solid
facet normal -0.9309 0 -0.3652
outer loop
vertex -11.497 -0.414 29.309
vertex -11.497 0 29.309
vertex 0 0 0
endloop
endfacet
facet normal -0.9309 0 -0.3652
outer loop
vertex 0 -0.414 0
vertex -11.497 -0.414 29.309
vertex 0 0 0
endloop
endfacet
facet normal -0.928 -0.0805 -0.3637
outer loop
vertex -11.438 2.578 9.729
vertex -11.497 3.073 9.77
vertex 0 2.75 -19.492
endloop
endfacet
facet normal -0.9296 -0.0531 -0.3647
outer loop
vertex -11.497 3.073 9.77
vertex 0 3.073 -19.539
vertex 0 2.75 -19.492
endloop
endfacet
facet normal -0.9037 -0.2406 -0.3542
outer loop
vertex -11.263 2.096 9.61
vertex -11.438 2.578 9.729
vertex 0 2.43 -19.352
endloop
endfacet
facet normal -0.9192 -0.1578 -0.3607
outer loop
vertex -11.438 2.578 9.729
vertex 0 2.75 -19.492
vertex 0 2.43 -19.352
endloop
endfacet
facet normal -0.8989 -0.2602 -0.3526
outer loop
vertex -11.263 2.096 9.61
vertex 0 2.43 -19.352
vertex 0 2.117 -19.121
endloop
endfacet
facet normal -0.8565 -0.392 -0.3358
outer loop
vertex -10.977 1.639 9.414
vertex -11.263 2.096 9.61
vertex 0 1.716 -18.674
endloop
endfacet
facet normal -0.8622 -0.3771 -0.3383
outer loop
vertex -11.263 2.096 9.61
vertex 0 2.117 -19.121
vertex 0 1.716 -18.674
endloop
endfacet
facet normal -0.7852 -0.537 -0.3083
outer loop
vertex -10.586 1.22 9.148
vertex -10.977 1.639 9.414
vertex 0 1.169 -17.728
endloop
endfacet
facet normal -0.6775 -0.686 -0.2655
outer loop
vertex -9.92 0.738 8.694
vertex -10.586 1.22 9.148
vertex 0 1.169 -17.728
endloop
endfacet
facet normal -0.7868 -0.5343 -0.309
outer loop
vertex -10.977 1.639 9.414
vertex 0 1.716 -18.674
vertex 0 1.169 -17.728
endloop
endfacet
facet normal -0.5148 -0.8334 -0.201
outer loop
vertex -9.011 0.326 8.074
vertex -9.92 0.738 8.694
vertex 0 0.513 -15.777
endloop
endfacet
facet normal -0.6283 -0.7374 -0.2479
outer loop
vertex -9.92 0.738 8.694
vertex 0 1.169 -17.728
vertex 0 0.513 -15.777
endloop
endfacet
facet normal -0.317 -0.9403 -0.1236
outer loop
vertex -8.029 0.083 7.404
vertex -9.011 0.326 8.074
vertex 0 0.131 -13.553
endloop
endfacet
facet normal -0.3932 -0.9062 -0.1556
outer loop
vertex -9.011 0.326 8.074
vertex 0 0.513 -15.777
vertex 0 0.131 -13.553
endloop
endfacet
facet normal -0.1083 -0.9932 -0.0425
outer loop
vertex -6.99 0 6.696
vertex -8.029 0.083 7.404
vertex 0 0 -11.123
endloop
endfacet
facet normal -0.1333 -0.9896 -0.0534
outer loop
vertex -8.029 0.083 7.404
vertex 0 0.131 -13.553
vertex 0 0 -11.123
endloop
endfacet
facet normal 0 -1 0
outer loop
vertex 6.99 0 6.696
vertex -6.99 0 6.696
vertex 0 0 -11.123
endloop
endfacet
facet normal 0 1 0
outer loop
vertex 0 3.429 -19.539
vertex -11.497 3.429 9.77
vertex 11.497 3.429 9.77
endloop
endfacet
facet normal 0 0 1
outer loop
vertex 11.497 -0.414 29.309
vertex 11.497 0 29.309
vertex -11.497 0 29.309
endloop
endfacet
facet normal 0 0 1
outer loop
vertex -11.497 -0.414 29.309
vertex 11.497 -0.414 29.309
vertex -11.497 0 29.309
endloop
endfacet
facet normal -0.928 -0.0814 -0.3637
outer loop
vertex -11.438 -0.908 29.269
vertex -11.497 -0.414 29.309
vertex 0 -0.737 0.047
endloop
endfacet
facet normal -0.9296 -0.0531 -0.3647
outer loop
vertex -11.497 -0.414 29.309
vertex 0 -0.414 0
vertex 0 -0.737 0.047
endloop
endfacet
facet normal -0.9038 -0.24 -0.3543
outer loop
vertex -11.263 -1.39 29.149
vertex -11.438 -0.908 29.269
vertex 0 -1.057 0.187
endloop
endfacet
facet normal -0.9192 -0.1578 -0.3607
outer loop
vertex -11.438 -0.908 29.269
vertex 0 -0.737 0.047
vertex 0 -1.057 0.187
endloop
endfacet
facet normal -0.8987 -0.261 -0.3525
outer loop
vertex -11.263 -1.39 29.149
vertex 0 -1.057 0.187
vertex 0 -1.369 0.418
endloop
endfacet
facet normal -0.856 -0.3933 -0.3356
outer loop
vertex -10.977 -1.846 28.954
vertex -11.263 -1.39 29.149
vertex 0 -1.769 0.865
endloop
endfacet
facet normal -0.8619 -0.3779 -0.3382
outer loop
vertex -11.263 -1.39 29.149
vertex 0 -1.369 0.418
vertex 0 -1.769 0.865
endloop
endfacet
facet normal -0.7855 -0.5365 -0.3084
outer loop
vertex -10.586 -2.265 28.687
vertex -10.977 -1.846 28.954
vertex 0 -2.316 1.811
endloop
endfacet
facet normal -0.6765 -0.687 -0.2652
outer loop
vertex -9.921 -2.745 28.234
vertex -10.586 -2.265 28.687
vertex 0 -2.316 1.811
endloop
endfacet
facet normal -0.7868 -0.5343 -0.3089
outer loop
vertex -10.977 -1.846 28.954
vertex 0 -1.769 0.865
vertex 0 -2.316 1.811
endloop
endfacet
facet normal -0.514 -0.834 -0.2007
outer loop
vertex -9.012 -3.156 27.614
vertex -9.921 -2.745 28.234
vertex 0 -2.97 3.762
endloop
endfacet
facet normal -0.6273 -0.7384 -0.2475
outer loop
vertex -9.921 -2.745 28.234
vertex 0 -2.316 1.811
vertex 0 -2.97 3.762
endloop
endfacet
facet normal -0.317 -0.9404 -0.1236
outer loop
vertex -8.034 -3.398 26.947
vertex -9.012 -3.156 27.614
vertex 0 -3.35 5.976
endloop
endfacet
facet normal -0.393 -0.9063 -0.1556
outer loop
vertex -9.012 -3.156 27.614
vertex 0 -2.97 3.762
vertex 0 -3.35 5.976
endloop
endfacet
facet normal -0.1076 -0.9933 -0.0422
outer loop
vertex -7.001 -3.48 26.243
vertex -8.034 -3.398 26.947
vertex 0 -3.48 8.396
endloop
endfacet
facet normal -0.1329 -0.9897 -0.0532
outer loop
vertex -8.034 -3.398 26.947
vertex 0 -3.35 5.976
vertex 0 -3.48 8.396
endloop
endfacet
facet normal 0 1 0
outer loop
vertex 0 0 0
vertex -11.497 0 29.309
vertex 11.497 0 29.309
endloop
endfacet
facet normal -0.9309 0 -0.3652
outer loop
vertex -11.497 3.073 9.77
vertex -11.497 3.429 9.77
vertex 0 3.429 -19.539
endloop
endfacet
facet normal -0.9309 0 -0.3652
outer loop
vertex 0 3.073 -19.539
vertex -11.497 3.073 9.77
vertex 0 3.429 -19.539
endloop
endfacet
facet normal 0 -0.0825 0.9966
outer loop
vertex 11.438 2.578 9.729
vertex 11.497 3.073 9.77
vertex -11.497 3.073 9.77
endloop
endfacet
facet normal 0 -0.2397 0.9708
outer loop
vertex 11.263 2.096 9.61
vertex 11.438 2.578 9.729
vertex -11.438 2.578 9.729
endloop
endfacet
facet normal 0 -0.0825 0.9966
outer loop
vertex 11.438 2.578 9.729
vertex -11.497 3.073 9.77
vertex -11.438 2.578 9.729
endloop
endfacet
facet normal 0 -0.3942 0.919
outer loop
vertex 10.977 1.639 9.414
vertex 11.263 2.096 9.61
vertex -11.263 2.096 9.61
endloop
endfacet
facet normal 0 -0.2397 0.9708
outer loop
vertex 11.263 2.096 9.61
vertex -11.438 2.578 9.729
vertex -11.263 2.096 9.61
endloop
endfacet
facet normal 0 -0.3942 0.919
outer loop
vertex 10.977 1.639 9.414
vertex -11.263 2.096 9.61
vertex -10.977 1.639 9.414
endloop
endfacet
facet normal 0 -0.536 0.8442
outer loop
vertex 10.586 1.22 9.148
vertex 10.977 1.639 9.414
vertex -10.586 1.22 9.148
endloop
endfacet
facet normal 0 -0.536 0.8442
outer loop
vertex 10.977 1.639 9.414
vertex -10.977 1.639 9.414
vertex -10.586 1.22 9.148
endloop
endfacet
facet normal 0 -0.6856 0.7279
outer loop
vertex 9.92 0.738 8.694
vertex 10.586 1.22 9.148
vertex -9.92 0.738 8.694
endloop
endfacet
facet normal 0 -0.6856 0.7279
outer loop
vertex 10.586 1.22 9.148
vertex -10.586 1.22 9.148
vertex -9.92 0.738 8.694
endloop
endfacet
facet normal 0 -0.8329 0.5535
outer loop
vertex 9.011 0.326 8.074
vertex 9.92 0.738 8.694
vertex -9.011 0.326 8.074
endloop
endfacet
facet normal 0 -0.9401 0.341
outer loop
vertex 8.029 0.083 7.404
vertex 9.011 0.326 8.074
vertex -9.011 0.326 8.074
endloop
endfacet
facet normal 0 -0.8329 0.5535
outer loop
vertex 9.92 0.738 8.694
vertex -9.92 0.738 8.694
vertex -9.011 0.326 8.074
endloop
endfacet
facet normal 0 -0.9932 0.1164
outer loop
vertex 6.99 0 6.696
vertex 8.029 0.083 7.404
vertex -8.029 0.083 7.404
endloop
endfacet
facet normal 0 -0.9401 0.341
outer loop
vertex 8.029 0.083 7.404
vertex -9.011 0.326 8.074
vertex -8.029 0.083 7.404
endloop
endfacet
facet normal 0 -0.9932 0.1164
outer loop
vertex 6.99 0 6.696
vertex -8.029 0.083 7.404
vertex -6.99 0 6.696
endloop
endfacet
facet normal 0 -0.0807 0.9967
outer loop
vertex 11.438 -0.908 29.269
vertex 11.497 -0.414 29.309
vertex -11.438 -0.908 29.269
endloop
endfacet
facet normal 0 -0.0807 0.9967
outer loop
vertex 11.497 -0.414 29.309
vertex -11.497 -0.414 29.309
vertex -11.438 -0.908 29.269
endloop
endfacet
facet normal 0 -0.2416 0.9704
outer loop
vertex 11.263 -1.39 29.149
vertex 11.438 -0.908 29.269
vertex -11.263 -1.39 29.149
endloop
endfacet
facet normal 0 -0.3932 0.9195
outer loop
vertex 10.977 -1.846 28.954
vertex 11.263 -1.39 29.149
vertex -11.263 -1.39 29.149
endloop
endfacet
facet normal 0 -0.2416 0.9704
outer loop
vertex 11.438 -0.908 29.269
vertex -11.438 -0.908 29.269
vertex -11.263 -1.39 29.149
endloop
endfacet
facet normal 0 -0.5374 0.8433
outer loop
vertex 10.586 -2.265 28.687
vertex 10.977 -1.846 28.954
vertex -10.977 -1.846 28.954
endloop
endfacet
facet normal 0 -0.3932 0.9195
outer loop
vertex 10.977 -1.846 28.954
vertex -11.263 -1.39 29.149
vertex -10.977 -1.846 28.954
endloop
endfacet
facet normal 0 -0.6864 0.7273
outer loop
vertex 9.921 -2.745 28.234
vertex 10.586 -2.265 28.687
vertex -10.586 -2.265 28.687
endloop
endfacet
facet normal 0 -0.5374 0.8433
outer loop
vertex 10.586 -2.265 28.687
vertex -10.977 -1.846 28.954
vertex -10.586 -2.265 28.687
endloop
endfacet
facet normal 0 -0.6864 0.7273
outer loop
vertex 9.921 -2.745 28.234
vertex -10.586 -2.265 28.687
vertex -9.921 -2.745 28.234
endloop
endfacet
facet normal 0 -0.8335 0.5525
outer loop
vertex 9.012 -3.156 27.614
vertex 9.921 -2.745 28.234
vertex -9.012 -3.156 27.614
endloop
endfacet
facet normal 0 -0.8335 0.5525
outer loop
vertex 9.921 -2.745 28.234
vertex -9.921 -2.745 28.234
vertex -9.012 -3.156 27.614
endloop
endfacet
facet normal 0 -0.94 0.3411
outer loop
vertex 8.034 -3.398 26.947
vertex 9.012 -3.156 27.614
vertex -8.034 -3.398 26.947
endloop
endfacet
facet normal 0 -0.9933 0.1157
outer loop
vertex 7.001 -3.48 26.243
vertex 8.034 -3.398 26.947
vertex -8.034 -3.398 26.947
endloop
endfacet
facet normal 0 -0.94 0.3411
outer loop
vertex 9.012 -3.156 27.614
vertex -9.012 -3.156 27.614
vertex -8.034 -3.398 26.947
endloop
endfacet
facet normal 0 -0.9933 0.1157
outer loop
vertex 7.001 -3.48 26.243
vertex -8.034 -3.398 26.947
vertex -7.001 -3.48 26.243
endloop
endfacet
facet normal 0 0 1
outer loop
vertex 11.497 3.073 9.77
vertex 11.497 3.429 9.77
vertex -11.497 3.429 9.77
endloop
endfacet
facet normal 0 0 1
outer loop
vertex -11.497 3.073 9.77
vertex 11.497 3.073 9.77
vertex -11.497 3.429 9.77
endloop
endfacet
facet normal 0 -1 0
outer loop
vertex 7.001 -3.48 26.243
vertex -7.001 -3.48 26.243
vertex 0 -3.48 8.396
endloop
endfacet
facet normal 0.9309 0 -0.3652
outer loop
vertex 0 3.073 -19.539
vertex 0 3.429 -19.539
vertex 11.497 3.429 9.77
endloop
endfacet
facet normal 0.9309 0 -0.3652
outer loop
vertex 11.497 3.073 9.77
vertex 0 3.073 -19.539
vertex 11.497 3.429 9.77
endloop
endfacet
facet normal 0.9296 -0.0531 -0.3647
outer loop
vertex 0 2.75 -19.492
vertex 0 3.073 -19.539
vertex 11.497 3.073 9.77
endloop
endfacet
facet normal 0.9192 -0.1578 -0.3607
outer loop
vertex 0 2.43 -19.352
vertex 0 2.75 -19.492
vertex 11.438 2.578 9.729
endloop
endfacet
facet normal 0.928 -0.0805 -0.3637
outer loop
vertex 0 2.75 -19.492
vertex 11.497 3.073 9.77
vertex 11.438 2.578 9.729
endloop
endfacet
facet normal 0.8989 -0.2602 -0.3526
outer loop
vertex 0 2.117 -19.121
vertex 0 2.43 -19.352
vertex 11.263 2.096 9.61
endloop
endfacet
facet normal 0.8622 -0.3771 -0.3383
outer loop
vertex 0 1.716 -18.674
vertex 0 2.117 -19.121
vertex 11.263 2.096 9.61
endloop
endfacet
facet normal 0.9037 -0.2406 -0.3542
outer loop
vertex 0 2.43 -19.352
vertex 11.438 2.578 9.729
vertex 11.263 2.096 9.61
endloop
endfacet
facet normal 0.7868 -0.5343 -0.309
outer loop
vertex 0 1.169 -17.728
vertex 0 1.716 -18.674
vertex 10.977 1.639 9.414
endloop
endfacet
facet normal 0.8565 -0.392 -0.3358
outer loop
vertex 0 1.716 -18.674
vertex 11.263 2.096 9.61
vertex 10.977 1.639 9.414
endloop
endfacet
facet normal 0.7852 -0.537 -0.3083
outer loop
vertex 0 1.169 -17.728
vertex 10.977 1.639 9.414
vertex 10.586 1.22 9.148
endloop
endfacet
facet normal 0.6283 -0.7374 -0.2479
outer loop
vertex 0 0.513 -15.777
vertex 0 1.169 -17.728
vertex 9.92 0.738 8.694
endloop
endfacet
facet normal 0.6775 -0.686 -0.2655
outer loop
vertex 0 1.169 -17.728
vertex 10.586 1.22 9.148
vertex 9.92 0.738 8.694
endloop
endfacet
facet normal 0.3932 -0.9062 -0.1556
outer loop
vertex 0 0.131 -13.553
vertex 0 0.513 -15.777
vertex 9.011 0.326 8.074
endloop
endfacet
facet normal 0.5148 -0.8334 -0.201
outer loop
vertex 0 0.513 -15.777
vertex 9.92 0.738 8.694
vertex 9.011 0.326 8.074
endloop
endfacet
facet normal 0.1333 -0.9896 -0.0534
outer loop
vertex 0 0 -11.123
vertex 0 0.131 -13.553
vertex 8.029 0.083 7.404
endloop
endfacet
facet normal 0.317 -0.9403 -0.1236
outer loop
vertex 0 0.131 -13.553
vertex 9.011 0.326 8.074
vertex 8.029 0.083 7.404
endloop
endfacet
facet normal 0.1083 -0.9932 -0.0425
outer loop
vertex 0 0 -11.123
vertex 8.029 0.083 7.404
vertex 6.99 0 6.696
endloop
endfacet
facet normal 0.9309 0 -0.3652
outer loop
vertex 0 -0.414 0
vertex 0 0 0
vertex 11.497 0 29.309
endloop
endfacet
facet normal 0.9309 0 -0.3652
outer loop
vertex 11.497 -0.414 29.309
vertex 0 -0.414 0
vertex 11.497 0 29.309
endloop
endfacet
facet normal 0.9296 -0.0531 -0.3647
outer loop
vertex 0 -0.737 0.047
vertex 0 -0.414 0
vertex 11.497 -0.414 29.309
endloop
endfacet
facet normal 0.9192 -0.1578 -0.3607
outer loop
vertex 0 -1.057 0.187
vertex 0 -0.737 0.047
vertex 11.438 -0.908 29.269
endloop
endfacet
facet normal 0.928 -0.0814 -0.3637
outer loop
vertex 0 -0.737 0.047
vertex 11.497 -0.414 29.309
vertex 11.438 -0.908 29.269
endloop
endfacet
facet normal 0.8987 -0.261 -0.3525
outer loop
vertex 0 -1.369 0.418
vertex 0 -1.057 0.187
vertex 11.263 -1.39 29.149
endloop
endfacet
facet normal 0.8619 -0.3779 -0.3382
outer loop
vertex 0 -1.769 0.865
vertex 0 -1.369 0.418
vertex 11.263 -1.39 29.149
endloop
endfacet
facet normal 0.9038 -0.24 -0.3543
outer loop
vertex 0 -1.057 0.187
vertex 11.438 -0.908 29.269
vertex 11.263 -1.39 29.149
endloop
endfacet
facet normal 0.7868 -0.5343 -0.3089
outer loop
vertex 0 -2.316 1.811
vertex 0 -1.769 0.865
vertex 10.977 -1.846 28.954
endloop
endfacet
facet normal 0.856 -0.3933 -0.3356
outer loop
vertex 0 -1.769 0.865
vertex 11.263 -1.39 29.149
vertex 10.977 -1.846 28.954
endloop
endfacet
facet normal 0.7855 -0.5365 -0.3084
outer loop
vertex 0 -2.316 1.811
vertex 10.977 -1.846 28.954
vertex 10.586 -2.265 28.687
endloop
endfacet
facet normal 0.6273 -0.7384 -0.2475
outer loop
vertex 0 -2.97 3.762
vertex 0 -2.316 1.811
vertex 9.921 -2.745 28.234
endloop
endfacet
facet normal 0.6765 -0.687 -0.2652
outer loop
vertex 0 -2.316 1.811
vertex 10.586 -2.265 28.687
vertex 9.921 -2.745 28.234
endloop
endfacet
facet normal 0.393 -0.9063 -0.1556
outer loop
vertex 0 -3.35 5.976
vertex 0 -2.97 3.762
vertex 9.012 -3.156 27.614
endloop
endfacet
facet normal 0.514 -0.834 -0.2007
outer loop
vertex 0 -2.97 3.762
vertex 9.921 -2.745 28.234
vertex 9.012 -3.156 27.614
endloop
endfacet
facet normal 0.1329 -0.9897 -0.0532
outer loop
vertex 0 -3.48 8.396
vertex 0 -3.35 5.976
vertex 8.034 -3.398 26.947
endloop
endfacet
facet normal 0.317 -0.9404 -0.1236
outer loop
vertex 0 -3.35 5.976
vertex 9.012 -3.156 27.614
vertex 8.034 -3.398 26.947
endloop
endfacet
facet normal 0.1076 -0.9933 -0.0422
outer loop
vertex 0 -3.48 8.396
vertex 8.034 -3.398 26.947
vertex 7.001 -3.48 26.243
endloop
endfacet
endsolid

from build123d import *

# Parameters (mm, degrees)
F1_DEPTH = 3.4798
F2_R     = 3.066051
F5_DEPTH = 3.429
F6_R     = 3.0734


with BuildPart() as f1:
    # F0 (on Front) → F1 (new body)
    with BuildSketch(Plane.XZ):
        Polygon((11.497315, 29.308729), (-11.497315, 29.308729), (0, 0), align=None)
    extrude(amount=F1_DEPTH)

    # F2
    f2_edges = [f1.edges().sort_by_distance(p)[0] for p in [
        (0, -3.4798, 29.308729),
        (-5.748658, -3.4798, 14.654364),
        (5.748658, -3.4798, 14.654364),
    ]]
    fillet(f2_edges, radius=F2_R)


with BuildPart() as f5:
    # F4 (on offset) → F5 (new body)
    with BuildSketch(Plane.XZ.offset(-3.429)):
        Polygon((11.497315, 9.769576), (-11.497315, 9.769576), (0, -19.539153), align=None)
    extrude(amount=F5_DEPTH)

    # F6
    f6_edges = [f5.edges().sort_by_distance(p)[0] for p in [
        (5.748658, 0, -4.884788),
        (0, 0, 9.769576),
        (-5.748658, 0, -4.884788),
    ]]
    fillet(f6_edges, radius=F6_R)


solid = Compound([f1.part, f5.part])
